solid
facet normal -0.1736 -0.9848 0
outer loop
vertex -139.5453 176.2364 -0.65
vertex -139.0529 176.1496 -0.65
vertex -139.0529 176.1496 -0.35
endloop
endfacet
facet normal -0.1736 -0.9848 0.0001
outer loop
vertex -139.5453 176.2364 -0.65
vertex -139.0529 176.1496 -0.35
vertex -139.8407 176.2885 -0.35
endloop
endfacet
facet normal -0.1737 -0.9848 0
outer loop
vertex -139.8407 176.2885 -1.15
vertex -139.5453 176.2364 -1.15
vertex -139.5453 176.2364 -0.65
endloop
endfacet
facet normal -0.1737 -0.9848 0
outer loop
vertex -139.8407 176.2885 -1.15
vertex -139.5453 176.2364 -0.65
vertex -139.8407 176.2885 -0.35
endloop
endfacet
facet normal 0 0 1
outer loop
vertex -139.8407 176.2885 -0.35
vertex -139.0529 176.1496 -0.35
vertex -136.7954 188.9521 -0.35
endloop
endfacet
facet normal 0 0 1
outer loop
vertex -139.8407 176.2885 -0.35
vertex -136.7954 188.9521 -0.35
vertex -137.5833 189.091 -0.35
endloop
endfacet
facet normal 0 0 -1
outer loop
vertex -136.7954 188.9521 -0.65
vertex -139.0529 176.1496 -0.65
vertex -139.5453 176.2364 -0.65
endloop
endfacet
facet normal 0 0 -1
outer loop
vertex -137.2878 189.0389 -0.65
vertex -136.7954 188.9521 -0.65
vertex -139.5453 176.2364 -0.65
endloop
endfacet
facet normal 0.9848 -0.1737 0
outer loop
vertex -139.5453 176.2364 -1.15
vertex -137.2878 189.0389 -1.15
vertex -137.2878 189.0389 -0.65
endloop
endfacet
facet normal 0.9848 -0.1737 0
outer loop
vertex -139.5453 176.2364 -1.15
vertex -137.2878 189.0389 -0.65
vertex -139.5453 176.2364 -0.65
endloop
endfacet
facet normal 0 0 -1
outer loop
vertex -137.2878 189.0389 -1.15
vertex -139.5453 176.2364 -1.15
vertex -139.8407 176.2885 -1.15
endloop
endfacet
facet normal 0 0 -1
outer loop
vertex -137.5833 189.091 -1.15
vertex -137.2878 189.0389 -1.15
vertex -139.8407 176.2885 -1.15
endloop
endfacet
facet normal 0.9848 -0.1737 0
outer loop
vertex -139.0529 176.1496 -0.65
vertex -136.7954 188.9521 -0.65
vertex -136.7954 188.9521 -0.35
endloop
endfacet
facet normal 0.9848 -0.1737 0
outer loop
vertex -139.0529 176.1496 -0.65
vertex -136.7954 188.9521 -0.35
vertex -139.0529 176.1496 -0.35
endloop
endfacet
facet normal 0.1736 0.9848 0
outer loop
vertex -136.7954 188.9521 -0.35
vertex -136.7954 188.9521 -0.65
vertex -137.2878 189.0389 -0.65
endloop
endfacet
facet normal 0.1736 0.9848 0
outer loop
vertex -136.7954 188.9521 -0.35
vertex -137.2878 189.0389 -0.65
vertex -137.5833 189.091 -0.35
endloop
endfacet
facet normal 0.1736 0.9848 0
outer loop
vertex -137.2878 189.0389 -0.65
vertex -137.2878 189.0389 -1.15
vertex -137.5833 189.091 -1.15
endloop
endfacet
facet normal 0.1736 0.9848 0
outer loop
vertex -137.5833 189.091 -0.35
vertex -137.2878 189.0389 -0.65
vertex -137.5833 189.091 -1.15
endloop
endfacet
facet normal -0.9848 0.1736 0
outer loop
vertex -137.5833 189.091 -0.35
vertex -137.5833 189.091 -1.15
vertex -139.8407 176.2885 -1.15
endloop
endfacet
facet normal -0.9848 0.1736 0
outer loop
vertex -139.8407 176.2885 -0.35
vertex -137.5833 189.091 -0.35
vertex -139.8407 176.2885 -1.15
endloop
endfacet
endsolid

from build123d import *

# Parameters (mm, degrees)
BOX181_W               = 0.8
BOX181_H               = 13
BOX181_DEPTH           = 0.8
BOX182_W               = 0.8
BOX182_H               = 13
BOX182_DEPTH           = 0.8
CUT094_PLACEMENT_ANGLE = 170


with BuildPart() as cubo181:
    # Box181 → Box181 (new body)
    with BuildSketch(Plane.XY):
        with Locations((0.4, 6.5)):
            Rectangle(BOX181_W, BOX181_H)
    extrude(amount=BOX181_DEPTH)


with BuildPart() as perfil_l_2da_cara036:
    # Box182 → Box182 (new body)
    with BuildSketch(Plane(origin=(0.3, 0, 0.3), x_dir=(1, 0, 0), z_dir=(0, 0, 1))):
        with Locations((0.4, 6.5)):
            Rectangle(BOX182_W, BOX182_H)
    extrude(amount=BOX182_DEPTH)

    # Cut094: cut Cubo181
    add(cubo181.part, mode=Mode.SUBTRACT)


with BuildPart() as perfil_l_2da_cara036_1:
    # Cut094 placement: moved
    add(perfil_l_2da_cara036.part.moved(Location((-136.5, 188.9, -1.45))).rotate(Axis((-136.5, 188.9, -1.45), (0, 0, 1)), CUT094_PLACEMENT_ANGLE))


solid = perfil_l_2da_cara036_1.part
